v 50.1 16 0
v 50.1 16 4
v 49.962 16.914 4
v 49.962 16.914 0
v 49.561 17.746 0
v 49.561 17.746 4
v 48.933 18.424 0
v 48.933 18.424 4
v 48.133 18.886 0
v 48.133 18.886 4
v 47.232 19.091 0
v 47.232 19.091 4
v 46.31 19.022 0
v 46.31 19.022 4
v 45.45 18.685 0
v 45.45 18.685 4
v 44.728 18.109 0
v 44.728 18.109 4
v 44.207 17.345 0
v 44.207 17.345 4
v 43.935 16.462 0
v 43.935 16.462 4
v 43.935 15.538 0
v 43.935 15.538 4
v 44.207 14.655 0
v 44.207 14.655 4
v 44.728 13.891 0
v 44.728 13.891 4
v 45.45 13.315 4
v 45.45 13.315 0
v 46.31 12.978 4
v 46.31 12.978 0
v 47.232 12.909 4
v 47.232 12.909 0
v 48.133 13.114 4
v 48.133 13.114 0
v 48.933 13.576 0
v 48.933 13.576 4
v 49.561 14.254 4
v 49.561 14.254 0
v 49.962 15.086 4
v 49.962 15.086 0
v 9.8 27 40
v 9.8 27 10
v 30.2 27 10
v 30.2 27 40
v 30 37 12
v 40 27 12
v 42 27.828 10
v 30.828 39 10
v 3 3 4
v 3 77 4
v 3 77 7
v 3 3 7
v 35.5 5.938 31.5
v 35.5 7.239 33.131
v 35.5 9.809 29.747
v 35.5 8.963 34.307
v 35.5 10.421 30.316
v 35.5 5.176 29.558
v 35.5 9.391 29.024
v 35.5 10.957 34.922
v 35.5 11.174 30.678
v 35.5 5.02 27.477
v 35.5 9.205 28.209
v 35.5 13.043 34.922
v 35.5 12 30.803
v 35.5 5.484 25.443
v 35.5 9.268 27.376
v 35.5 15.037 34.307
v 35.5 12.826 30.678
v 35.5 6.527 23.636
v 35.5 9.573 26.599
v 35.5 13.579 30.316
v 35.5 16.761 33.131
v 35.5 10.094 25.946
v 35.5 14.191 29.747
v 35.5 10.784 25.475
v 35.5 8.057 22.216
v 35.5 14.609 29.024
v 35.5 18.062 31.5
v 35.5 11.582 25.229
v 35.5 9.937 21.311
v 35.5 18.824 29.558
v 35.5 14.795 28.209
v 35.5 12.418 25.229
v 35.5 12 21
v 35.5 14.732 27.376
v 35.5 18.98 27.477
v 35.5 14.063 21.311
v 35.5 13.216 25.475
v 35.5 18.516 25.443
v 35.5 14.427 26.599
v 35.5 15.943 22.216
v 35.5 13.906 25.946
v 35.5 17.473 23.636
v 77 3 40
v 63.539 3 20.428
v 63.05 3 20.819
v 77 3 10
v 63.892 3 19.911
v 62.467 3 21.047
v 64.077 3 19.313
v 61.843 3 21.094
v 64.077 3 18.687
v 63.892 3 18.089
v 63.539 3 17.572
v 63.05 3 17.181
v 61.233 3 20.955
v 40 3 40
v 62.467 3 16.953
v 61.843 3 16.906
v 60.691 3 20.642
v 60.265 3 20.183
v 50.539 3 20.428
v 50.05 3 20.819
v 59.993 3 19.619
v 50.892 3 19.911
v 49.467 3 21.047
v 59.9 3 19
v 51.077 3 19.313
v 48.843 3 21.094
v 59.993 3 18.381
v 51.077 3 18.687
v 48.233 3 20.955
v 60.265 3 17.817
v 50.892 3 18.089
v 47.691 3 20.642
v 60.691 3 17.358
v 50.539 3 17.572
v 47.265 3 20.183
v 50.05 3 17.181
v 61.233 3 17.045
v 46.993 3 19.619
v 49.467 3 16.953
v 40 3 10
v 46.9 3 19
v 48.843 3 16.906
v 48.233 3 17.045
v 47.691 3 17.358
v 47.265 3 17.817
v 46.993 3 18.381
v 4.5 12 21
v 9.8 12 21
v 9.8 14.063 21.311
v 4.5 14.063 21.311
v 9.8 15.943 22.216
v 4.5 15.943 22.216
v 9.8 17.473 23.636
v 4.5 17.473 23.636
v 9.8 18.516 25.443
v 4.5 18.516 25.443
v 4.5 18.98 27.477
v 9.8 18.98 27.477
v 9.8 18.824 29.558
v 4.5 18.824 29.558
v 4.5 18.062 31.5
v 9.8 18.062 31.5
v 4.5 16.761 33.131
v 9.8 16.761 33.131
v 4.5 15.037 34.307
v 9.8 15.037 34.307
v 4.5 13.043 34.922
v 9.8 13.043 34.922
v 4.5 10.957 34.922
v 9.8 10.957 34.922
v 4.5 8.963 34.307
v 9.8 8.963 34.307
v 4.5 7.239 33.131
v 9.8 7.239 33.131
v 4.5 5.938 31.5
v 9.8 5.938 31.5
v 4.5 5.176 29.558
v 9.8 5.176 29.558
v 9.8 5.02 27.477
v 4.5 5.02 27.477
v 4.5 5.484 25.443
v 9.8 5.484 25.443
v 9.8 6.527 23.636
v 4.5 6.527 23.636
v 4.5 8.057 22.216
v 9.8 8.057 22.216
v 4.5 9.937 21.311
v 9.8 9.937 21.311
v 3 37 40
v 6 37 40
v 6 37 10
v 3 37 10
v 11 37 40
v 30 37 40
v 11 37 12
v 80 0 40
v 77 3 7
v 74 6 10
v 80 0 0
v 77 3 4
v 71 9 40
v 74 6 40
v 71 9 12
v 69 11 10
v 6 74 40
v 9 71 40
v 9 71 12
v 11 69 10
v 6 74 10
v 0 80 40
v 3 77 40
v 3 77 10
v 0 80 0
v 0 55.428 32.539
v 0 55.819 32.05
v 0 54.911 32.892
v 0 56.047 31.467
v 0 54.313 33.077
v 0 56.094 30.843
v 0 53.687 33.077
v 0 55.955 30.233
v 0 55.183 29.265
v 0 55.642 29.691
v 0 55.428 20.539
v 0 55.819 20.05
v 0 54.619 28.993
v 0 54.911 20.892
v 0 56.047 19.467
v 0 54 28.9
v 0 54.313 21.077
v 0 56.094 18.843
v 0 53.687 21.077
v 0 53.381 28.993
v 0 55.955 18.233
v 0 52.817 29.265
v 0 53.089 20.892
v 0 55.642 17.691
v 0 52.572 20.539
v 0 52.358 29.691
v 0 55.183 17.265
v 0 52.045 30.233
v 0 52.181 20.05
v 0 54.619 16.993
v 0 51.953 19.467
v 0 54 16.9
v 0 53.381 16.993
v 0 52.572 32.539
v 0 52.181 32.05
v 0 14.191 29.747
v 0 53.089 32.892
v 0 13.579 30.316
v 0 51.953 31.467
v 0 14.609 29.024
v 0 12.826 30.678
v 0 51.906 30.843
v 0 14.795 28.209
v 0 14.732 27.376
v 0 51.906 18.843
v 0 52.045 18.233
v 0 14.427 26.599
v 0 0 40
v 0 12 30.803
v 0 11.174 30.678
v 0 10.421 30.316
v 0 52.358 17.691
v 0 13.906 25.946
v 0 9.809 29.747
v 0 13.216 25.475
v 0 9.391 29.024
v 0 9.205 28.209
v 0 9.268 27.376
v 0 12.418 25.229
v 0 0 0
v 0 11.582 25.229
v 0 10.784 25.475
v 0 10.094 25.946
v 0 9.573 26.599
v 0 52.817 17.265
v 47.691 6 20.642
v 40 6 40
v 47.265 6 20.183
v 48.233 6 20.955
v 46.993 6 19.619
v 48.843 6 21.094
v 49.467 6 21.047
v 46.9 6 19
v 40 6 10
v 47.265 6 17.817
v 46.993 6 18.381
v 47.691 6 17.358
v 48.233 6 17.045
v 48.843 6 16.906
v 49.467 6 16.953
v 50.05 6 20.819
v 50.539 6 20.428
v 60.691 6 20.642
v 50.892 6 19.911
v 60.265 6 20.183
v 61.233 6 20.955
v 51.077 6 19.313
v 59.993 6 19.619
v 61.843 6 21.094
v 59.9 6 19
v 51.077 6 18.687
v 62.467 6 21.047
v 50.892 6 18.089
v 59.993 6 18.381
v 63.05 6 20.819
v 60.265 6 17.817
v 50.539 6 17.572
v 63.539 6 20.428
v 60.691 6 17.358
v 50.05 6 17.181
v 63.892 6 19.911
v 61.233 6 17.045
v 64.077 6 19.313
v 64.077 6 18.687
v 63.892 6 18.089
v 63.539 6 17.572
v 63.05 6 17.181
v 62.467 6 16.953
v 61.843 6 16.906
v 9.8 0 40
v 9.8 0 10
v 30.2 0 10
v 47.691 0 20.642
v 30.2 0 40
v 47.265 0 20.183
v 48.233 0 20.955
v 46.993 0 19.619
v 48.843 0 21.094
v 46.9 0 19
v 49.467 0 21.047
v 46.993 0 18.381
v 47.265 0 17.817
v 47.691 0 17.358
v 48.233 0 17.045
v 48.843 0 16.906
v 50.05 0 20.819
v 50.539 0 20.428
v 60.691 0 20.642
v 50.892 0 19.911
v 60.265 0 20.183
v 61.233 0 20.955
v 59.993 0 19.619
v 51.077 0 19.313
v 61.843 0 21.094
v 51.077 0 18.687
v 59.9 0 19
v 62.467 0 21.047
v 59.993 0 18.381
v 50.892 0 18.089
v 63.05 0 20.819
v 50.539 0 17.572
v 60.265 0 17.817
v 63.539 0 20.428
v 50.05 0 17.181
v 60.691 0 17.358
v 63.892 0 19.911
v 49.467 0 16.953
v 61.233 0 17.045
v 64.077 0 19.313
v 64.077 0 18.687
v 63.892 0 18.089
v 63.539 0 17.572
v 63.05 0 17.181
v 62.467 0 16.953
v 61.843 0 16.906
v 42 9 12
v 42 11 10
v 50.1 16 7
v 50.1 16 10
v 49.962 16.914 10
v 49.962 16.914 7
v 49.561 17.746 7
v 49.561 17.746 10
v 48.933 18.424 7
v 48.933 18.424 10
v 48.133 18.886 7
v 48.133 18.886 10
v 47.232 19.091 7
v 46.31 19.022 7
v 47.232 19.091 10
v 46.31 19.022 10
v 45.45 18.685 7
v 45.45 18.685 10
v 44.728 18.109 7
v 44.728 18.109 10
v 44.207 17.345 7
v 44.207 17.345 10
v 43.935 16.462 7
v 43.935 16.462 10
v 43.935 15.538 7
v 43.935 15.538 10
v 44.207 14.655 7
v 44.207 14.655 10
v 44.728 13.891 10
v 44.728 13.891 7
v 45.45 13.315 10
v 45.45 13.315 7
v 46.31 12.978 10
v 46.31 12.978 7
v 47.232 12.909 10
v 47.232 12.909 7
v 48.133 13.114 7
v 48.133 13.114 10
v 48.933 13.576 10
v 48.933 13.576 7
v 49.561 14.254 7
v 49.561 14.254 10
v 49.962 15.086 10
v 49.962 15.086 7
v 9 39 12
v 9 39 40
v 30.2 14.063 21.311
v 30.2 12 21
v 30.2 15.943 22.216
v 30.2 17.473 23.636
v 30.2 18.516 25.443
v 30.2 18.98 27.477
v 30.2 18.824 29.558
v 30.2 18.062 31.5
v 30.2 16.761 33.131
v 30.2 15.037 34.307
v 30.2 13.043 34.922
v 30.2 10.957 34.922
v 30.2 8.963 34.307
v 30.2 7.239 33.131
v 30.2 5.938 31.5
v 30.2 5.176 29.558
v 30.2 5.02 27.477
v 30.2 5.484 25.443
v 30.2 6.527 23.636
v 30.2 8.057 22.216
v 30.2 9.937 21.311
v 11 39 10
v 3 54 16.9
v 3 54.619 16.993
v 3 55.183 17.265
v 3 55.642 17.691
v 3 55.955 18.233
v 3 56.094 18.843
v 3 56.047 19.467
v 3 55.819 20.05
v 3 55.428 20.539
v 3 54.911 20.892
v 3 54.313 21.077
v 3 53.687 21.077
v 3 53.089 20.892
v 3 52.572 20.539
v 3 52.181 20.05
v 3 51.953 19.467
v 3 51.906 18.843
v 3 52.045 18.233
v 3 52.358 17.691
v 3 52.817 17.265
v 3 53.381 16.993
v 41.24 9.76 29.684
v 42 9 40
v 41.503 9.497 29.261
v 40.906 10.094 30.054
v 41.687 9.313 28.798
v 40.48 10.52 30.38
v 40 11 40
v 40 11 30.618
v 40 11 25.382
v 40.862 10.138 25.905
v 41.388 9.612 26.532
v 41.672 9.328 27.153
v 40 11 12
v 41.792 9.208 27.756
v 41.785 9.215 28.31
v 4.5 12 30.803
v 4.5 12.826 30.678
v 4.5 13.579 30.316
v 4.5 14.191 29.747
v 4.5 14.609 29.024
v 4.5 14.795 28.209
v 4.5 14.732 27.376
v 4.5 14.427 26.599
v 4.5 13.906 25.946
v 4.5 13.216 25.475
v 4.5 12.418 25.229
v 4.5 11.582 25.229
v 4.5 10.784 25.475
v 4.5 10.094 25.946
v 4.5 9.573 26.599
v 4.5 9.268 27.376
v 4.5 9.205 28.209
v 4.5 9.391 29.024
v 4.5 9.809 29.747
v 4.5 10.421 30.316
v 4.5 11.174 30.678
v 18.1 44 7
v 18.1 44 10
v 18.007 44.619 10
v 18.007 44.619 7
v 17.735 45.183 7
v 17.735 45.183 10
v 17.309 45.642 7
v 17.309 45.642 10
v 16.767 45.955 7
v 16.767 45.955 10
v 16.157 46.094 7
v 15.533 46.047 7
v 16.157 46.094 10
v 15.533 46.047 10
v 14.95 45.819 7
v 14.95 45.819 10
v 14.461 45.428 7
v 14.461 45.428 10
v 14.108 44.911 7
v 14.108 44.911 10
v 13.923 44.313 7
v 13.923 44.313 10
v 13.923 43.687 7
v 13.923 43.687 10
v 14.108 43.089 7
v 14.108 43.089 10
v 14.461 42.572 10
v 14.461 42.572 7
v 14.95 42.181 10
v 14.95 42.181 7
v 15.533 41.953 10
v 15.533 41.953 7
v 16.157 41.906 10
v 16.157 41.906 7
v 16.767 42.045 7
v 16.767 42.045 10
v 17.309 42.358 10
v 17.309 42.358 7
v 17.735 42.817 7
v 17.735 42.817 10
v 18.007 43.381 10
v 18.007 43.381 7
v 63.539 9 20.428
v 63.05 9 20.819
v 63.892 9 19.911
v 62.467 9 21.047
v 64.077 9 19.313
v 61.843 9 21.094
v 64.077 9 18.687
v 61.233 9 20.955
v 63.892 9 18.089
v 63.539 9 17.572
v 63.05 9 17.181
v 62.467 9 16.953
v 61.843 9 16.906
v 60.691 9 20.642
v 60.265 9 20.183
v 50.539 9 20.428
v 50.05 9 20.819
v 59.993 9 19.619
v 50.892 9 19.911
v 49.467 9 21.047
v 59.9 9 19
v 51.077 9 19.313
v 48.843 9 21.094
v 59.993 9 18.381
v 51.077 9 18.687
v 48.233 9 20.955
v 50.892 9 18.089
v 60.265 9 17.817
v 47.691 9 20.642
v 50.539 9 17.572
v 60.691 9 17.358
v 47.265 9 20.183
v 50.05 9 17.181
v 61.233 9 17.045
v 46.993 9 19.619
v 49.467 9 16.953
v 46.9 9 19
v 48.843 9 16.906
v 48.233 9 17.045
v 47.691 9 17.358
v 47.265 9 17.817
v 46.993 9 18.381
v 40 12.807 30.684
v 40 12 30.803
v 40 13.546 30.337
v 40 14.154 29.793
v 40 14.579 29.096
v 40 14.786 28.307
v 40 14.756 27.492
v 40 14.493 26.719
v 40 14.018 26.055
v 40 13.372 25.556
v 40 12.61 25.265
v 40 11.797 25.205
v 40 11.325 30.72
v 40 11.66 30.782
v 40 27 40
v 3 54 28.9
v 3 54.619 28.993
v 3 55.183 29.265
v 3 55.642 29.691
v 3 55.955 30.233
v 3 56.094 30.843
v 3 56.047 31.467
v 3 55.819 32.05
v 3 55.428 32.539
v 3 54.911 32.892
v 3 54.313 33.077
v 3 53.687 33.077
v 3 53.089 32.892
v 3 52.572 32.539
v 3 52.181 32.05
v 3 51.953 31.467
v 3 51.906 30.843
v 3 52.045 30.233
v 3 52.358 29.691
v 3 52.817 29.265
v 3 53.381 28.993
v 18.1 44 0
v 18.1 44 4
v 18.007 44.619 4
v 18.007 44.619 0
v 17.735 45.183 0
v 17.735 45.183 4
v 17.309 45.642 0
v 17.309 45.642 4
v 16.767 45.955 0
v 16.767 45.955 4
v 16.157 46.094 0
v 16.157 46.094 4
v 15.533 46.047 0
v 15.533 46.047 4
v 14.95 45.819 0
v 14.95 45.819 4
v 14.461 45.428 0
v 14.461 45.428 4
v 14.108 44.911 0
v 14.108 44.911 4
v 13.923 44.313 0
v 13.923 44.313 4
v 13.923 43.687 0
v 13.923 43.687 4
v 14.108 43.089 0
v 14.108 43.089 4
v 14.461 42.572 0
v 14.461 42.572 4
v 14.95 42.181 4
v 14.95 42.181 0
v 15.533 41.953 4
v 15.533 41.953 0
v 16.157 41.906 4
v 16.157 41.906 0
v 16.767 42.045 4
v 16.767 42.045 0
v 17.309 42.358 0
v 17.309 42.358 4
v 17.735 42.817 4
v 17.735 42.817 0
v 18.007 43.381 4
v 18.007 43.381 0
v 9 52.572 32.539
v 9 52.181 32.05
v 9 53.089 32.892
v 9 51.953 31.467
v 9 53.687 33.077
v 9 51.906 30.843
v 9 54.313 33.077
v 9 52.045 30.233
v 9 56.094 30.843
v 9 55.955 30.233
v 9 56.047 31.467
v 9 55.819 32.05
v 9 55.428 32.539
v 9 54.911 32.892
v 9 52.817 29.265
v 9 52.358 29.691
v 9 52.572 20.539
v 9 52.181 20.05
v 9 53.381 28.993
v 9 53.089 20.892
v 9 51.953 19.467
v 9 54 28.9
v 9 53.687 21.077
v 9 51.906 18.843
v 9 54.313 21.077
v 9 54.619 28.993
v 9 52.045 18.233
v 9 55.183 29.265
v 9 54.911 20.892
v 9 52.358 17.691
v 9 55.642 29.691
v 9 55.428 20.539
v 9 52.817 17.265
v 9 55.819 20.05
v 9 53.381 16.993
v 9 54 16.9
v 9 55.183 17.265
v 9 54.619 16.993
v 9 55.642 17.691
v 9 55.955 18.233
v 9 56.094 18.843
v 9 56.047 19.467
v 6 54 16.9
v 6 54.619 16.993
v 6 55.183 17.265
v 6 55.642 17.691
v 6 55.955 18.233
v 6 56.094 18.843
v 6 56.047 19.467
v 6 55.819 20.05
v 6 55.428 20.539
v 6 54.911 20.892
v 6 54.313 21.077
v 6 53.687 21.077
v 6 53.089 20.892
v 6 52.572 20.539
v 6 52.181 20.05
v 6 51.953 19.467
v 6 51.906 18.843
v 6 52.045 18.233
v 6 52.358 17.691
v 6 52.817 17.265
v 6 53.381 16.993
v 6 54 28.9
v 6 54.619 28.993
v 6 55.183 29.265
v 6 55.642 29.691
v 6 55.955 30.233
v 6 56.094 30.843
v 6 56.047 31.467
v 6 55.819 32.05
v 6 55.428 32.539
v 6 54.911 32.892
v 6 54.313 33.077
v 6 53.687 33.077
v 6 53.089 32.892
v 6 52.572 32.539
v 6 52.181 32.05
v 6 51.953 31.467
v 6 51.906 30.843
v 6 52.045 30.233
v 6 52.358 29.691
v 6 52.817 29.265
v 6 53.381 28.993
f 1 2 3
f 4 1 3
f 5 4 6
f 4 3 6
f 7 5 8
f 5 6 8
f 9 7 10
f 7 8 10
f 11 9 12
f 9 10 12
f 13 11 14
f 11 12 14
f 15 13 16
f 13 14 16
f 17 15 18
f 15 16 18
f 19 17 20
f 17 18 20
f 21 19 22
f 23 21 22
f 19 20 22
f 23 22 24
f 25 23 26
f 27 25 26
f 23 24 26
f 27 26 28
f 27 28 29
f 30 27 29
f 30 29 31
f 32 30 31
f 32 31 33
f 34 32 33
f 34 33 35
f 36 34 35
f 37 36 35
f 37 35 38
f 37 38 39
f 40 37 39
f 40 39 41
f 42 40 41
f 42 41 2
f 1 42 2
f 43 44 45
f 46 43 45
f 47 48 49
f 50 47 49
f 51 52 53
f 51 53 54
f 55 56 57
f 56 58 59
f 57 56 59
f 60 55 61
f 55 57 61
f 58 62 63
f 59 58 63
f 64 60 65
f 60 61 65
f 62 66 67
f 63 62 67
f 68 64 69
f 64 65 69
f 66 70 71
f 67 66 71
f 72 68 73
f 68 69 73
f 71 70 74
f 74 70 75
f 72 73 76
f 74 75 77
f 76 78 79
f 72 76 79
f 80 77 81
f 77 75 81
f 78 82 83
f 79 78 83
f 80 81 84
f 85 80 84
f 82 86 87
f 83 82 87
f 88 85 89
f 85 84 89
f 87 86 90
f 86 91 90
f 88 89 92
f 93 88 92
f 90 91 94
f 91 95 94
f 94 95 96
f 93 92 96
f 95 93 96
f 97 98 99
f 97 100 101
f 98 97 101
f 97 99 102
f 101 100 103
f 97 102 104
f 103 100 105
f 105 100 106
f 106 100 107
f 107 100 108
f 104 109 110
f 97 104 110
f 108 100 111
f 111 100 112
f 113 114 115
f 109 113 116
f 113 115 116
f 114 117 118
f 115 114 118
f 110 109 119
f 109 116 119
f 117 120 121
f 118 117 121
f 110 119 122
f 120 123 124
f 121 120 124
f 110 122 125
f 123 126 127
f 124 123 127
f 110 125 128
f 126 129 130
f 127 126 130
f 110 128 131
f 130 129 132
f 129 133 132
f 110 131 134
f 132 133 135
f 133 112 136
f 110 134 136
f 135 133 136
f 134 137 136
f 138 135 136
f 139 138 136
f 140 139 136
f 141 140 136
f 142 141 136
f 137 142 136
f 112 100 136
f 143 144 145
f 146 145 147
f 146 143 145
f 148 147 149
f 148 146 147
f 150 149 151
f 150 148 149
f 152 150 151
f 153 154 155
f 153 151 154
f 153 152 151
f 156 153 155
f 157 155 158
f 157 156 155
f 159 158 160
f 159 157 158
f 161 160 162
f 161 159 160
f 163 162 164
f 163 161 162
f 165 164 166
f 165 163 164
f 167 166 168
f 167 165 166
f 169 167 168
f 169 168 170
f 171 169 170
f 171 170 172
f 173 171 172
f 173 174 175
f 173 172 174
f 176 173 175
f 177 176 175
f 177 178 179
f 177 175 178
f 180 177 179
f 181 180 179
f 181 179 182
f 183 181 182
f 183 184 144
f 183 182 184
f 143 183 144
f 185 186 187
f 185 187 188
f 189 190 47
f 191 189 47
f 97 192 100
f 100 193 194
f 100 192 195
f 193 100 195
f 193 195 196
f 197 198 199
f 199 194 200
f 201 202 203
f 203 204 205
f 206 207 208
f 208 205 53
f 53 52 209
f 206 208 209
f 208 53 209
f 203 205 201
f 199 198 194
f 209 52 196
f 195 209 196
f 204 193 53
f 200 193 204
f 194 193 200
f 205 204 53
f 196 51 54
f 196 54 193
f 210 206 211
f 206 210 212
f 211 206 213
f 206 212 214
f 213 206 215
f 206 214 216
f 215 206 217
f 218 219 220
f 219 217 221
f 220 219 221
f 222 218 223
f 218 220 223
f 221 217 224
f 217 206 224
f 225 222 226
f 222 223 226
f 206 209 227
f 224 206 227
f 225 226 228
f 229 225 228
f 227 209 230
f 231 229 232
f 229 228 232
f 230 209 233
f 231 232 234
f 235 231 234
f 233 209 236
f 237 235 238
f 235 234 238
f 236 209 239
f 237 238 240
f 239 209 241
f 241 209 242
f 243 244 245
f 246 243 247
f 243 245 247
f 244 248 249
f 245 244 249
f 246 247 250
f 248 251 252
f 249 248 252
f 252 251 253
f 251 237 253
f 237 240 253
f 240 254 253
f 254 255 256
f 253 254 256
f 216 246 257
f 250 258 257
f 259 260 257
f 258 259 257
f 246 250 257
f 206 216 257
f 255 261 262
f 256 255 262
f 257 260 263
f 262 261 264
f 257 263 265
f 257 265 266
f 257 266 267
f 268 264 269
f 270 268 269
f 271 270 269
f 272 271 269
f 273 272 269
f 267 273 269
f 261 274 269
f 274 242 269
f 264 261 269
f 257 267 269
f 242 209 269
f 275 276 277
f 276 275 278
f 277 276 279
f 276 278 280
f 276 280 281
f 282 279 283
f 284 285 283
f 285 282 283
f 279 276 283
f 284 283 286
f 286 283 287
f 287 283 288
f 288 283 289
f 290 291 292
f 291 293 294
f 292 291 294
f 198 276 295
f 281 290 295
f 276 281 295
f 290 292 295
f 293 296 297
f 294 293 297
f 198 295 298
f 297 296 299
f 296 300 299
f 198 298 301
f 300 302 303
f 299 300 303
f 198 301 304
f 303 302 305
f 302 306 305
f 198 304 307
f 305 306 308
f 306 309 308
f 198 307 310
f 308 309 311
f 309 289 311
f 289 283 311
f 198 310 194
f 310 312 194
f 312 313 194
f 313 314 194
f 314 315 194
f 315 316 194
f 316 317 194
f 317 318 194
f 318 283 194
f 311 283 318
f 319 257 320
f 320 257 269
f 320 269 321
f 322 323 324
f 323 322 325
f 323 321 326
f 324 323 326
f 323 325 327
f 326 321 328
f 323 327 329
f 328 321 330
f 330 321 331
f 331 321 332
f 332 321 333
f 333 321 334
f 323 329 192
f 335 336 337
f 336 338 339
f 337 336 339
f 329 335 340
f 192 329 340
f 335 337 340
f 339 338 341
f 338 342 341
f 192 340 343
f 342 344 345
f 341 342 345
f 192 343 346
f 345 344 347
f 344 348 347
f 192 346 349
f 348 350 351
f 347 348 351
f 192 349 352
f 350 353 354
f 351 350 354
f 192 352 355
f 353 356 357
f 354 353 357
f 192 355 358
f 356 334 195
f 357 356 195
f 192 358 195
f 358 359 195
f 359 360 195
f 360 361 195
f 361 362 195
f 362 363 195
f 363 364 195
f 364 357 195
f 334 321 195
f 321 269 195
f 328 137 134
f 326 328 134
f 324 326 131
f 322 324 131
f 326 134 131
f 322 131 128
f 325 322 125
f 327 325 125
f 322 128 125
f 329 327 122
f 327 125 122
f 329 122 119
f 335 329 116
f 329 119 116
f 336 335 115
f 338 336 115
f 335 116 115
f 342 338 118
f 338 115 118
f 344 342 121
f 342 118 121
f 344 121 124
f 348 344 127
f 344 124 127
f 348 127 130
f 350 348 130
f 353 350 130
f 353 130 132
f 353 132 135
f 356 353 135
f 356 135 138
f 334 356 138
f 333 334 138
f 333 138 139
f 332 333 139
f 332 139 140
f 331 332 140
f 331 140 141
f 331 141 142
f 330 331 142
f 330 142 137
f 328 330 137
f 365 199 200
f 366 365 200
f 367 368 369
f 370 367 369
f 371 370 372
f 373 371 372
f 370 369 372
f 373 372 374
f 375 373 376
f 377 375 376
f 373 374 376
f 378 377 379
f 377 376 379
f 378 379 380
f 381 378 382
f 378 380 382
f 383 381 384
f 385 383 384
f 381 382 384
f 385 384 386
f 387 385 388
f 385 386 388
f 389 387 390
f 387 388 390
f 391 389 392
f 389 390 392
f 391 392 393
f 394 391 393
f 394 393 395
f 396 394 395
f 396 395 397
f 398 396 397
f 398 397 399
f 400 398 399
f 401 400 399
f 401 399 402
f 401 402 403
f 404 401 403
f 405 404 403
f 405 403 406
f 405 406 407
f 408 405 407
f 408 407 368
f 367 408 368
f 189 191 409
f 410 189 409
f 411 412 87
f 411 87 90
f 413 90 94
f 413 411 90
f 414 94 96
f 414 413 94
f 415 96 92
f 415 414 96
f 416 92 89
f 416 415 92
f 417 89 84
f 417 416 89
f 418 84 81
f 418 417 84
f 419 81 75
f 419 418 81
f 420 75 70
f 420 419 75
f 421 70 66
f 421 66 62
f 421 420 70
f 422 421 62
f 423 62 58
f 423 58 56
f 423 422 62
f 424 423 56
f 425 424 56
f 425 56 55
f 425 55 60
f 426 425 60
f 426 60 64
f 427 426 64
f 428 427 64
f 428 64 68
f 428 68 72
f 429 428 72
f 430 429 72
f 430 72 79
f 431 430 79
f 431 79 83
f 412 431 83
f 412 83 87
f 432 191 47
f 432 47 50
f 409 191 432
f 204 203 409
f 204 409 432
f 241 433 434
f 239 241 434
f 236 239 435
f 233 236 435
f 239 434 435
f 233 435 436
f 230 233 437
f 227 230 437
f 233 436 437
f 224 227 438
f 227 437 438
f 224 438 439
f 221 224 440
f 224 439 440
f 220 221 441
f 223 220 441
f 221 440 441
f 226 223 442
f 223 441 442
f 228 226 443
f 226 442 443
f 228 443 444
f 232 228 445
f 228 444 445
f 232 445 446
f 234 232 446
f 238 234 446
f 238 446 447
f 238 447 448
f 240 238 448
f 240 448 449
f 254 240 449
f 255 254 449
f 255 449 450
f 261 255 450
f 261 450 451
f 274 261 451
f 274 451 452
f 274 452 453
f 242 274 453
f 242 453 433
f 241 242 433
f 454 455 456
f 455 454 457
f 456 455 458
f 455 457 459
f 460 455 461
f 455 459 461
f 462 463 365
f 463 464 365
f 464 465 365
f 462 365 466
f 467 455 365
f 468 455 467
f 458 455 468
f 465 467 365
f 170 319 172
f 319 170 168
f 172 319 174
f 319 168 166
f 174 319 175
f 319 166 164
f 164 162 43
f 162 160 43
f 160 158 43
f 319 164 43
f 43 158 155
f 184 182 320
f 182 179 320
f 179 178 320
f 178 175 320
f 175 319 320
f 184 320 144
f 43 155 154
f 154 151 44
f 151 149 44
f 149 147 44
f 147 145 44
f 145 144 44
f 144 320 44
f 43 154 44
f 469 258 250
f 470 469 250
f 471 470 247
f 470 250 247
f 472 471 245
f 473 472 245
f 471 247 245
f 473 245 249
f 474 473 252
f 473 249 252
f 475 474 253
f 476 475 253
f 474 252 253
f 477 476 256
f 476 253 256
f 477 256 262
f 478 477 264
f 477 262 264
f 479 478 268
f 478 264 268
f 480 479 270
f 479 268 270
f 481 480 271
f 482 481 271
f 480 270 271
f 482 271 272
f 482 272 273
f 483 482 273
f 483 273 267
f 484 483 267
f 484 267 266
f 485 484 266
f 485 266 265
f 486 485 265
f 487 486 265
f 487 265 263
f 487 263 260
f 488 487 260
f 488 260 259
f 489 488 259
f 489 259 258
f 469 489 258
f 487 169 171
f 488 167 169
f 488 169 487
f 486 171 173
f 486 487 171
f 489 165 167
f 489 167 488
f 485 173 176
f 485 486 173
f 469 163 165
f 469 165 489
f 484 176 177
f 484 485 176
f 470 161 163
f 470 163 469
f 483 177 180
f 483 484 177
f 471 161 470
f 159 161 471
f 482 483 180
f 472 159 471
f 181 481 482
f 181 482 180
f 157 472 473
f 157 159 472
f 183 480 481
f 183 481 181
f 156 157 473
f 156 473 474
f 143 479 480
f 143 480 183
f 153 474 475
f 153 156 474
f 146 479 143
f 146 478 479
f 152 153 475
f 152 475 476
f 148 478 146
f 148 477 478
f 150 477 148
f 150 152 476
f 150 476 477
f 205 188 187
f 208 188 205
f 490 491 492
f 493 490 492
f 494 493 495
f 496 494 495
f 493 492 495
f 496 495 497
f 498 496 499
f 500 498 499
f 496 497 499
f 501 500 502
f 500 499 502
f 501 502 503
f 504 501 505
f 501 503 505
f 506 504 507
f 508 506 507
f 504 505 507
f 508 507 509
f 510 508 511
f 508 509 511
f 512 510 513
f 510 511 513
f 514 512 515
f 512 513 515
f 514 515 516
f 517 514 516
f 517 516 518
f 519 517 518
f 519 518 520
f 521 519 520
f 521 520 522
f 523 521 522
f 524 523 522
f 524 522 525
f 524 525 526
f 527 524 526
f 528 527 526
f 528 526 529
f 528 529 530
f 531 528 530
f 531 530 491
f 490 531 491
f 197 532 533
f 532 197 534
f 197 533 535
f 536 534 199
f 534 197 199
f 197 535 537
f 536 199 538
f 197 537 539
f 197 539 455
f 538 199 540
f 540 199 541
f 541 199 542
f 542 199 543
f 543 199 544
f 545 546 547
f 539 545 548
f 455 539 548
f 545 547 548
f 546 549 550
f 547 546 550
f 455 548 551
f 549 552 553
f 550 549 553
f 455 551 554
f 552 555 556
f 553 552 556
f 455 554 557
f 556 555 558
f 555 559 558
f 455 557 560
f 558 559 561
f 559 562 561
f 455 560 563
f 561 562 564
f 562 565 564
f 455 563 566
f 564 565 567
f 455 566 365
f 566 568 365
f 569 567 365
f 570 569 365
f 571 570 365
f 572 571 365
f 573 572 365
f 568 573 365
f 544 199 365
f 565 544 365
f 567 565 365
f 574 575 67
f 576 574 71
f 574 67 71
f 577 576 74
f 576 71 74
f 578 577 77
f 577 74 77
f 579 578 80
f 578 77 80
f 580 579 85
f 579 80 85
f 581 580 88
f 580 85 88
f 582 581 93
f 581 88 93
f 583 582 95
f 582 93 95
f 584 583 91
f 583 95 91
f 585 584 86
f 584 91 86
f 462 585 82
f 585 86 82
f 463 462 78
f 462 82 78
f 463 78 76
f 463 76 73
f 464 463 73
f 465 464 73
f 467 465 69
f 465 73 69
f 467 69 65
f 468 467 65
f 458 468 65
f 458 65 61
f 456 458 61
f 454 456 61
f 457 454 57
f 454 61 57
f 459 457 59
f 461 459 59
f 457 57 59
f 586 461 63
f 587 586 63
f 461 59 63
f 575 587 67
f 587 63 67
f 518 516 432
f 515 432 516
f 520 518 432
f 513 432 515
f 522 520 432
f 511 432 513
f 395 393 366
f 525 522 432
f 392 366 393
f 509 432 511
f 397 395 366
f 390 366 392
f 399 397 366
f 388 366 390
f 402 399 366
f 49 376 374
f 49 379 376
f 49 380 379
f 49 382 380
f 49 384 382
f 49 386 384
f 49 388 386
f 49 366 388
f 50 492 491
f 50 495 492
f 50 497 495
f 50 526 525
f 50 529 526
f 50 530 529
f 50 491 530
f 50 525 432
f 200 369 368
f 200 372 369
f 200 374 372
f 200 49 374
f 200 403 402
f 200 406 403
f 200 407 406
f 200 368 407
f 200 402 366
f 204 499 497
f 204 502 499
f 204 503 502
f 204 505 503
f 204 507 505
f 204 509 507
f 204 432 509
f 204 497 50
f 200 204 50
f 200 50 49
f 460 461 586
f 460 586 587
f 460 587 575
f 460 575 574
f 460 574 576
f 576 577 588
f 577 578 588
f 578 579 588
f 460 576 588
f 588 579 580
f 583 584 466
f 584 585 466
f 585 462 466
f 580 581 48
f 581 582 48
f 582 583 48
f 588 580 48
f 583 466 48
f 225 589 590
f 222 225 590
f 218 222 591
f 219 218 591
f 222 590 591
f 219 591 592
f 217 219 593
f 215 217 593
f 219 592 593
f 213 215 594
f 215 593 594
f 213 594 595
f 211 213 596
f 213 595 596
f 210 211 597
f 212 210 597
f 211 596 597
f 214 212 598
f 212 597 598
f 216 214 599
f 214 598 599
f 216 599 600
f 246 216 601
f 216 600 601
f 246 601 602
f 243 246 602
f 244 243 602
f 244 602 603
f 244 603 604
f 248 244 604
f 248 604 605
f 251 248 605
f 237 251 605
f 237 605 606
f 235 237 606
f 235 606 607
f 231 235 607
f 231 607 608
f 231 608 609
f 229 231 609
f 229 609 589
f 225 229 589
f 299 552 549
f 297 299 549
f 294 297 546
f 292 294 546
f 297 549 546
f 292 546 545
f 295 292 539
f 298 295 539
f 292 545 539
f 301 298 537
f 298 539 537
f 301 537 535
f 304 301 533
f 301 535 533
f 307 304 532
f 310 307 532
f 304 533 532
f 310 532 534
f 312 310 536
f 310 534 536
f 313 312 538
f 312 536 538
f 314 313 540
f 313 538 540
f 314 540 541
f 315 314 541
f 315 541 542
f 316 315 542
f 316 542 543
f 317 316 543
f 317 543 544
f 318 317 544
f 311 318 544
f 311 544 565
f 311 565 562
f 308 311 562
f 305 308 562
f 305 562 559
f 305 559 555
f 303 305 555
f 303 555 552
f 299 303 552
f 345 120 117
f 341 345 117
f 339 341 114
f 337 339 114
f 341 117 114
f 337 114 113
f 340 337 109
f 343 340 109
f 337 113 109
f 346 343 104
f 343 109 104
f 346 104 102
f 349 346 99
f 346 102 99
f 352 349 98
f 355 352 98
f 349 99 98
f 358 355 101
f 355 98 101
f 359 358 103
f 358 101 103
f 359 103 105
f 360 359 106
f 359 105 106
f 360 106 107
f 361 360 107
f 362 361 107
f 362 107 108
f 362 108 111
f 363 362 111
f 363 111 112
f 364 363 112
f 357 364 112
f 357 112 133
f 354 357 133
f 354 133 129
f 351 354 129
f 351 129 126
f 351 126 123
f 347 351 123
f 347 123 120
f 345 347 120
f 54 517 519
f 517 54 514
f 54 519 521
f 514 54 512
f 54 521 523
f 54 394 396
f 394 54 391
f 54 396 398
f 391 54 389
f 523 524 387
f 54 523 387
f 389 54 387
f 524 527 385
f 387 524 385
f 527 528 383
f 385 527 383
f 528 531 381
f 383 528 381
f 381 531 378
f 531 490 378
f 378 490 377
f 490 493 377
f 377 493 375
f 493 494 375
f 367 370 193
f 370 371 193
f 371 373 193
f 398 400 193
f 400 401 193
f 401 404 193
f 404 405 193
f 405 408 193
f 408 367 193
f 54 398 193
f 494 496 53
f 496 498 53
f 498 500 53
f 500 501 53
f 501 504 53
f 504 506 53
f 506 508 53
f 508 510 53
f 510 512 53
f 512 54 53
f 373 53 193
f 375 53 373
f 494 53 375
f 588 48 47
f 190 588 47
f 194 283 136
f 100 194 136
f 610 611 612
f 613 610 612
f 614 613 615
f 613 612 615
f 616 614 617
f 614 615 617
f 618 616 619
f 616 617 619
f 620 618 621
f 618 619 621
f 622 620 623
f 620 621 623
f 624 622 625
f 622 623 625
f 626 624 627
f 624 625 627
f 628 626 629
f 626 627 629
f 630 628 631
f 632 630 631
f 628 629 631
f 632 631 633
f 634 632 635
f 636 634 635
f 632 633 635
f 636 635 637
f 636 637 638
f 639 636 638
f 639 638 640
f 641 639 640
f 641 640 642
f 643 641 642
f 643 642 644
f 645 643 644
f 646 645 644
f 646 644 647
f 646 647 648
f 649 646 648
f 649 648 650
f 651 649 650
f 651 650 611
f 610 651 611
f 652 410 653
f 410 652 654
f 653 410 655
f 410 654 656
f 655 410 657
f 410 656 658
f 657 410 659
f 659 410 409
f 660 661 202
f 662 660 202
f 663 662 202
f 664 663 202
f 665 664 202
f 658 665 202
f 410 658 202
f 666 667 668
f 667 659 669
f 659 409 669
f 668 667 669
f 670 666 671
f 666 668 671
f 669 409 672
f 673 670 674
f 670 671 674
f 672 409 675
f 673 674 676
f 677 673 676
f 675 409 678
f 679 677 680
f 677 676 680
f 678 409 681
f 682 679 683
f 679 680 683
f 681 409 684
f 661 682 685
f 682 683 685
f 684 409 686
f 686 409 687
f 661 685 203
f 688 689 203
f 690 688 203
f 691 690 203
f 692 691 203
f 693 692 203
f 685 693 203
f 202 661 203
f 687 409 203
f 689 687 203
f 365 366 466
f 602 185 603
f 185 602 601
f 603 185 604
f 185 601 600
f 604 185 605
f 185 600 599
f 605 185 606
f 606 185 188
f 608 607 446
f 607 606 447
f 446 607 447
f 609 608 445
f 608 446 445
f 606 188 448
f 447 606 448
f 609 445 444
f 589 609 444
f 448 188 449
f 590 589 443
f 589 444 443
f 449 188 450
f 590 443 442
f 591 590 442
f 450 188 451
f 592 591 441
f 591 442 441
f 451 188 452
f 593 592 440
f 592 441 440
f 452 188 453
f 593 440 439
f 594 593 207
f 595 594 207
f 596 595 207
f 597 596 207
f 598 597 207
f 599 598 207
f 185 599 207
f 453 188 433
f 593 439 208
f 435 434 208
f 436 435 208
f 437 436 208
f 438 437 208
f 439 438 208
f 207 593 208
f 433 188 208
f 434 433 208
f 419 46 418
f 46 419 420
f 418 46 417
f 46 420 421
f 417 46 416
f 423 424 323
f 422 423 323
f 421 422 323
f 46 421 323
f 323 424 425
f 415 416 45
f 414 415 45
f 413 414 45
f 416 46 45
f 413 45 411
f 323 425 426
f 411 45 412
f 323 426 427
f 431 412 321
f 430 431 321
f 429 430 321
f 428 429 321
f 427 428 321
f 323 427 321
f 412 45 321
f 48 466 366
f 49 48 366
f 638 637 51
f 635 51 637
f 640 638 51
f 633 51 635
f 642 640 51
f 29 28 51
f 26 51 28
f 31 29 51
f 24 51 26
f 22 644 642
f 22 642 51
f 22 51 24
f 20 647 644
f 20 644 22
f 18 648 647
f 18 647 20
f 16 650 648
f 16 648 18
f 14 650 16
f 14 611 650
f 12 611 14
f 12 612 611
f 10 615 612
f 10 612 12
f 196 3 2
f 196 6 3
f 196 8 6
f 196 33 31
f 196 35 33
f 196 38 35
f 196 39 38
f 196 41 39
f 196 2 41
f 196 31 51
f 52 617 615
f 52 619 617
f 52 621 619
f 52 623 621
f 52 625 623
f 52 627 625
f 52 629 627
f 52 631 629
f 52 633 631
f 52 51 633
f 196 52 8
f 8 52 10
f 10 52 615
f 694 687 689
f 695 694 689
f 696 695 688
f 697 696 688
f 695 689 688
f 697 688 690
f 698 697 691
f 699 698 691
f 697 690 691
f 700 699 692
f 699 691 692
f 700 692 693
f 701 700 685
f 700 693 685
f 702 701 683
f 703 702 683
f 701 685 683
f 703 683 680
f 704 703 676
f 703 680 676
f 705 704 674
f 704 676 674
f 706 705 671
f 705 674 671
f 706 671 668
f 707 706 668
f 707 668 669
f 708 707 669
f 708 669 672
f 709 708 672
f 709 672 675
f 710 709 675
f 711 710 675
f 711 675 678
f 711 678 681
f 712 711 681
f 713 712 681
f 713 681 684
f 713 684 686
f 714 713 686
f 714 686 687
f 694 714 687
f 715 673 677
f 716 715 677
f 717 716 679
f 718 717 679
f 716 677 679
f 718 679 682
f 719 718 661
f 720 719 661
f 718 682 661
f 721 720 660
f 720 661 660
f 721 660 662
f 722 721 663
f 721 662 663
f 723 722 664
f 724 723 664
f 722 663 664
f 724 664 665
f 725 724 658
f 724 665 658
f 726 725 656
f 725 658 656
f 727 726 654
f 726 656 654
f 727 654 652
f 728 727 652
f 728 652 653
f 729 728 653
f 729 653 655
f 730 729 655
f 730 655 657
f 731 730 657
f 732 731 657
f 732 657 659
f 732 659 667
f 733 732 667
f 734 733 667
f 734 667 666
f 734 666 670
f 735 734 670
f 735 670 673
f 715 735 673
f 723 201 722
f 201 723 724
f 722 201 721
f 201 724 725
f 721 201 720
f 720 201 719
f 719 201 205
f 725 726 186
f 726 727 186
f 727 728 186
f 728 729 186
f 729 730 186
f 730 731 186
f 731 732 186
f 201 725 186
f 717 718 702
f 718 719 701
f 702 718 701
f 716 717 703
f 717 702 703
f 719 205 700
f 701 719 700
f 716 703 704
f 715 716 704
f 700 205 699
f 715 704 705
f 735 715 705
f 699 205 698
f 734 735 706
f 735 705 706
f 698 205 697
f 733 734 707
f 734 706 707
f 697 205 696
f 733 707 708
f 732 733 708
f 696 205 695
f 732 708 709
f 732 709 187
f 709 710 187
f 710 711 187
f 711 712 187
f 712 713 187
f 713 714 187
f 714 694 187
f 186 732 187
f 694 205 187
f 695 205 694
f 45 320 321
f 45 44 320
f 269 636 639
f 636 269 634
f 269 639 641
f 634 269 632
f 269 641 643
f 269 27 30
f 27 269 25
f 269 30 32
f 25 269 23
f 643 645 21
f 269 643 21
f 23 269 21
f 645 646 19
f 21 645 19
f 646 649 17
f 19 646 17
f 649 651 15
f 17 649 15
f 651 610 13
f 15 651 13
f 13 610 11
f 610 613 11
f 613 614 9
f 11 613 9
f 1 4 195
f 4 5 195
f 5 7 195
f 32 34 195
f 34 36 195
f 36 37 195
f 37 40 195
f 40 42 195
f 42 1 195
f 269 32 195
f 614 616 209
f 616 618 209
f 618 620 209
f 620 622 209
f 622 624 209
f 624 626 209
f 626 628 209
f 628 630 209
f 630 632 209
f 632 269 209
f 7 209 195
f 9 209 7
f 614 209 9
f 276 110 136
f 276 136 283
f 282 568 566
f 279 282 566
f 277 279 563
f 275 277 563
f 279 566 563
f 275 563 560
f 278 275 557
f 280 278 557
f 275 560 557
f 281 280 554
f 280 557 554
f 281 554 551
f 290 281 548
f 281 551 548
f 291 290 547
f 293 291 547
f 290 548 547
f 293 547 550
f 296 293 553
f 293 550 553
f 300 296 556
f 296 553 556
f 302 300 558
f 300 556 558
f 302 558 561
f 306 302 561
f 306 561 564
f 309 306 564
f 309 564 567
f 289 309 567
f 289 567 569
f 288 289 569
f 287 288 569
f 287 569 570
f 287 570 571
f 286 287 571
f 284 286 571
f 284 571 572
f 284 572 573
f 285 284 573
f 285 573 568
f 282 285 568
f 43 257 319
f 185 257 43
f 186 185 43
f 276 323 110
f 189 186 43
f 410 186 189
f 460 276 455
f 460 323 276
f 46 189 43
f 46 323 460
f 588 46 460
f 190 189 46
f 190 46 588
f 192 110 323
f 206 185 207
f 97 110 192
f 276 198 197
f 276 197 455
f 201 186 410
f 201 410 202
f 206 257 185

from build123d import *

# Parameters (mm, degrees)
DODANIE_WYCI_GNI_CIE1_DEPTH     = 4
DODANIE_WYCI_GNI_CIE2_DEPTH     = 3
DODANIE_WYCI_GNI_CIE3_DEPTH     = 3
DODANIE_WYCI_GNI_CIE4_DEPTH     = 30
WYTNIJ_WYCI_GNI_CIE1_DEPTH      = 15.5
WYTNIJ_WYCI_GNI_CIE1_DEPTH_BACK = 15.5
SZKIC5_R                        = 7
SZKIC6_R                        = 2.802594562
WYTNIJ_WYCI_GNI_CIE2_DEPTH      = 121
SFAZOWANIE1_SIZE                = 2
SZKIC7_R                        = 3.1
SZKIC7_R_2                      = 2.1
WYTNIJ_WYCI_GNI_CIE3_DEPTH      = 118.046999107
SZKIC8_R                        = 2.1
WYTNIJ_WYCI_GNI_CIE4_DEPTH      = 115.197197864
SZKIC9_R                        = 2.1
WYTNIJ_WYCI_GNI_CIE5_DEPTH      = 115.197197864


with BuildPart() as part:
    # Szkic1 → Dodanie-wyciągnięcie1 (new body)
    with BuildSketch(Plane.XY):
        Polygon((0, 0), (80, 0), (0, 80), align=None)
    extrude(amount=DODANIE_WYCI_GNI_CIE1_DEPTH)

    # Szkic2 → Dodanie-wyciągnięcie2 (add)
    with BuildSketch(Plane.XY.offset(4)):
        Polygon((3, 77), (3, 3), (77, 3), (80, 0), (0, 0), (0, 80), align=None)
    extrude(amount=DODANIE_WYCI_GNI_CIE2_DEPTH)

    # Szkic3 → Dodanie-wyciągnięcie3 (add)
    with BuildSketch(Plane.XY.offset(7)):
        Polygon((80, 0), (77, 3), (3, 77), (0, 80), (0, 0), align=None)
    extrude(amount=DODANIE_WYCI_GNI_CIE3_DEPTH)

    # Szkic4 → Dodanie-wyciągnięcie4 (add)
    with BuildSketch(Plane.XY.offset(10)):
        Polygon((30.2, 0), (80, 0), (77, 3), (40, 3), (40, 6), (74, 6), (71, 9), (40, 9), (40, 27), (30, 37), (9, 37), (9, 71), (6, 74), (6, 37), (3, 37), (3, 77), (0, 80), (0, 0), (9.8, 0), (9.8, 27), (30.2, 27), align=None)
    extrude(amount=DODANIE_WYCI_GNI_CIE4_DEPTH)

    # Szkic5 → Wytnij-wyciągnięcie1 (cut, two sides: drawn at the far end of the back side and taken through both)
    with BuildSketch(Plane(origin=(20, 0, 0), x_dir=(0, 0, -1), z_dir=(1, 0, 0)).offset(-WYTNIJ_WYCI_GNI_CIE1_DEPTH_BACK)):
        with Locations((-28, 12)):
            Circle(SZKIC5_R)
    extrude(amount=WYTNIJ_WYCI_GNI_CIE1_DEPTH + WYTNIJ_WYCI_GNI_CIE1_DEPTH_BACK, mode=Mode.SUBTRACT)

    # Szkic6 → Wytnij-wyciągnięcie2 (cut, through all)
    with BuildSketch(Plane.ZY):
        with Locations((28, 12)):
            Circle(SZKIC6_R)
    extrude(amount=-WYTNIJ_WYCI_GNI_CIE2_DEPTH, mode=Mode.SUBTRACT)

    # Sfazowanie1
    # the kernel refuses this chamfer: 2 mm, written as the material it adds along each edge
    with BuildSketch(Plane(origin=(10.333333333, 38.333333333, 11.333333333), x_dir=(-0.7071067811865475, 0.7071067811865475, 0), z_dir=(-0.5773502691896258, -0.5773502691896258, -0.5773502691896258))) as sfazowanie1_piece_1_section:
        Polygon((-1.414213562, -0.816496581), (1.414213562, -0.816496581), (0, 1.632993162), align=None)
    sfazowanie1_piece_1 = extrude(amount=2.540341184, mode=Mode.PRIVATE)
    sfazowanie1_piece_1 = split(sfazowanie1_piece_1, bisect_by=Plane(origin=(9, 37, 10), z_dir=(0, 1, 0)), keep=Keep.TOP, mode=Mode.PRIVATE)
    sfazowanie1_piece_1 = split(sfazowanie1_piece_1, bisect_by=Plane(origin=(9, 37, 10), z_dir=(1, 0, 0)), keep=Keep.TOP, mode=Mode.PRIVATE)
    sfazowanie1_piece_1 = split(sfazowanie1_piece_1, bisect_by=Plane(origin=(9, 37, 10), z_dir=(0, 0, 1)), keep=Keep.TOP, mode=Mode.PRIVATE)
    add(sfazowanie1_piece_1)
    with BuildSketch(Plane(origin=(41.333333333, 10.333333333, 11.333333333), x_dir=(0, -0.7071067811865475, 0.7071067811865475), z_dir=(-0.5773502691896258, -0.5773502691896258, -0.5773502691896258))) as sfazowanie1_piece_2_section:
        Polygon((-1.414213562, -0.816496581), (1.414213562, -0.816496581), (0, 1.632993162), align=None)
    sfazowanie1_piece_2 = extrude(amount=2.540341184, mode=Mode.PRIVATE)
    sfazowanie1_piece_2 = split(sfazowanie1_piece_2, bisect_by=Plane(origin=(40, 9, 10), z_dir=(0, 0, 1)), keep=Keep.TOP, mode=Mode.PRIVATE)
    sfazowanie1_piece_2 = split(sfazowanie1_piece_2, bisect_by=Plane(origin=(40, 9, 10), z_dir=(0, 1, 0)), keep=Keep.TOP, mode=Mode.PRIVATE)
    sfazowanie1_piece_2 = split(sfazowanie1_piece_2, bisect_by=Plane(origin=(40, 9, 10), z_dir=(1, 0, 0)), keep=Keep.TOP, mode=Mode.PRIVATE)
    add(sfazowanie1_piece_2)
    with BuildSketch(Plane(origin=(9, 37, 4.856634024), x_dir=(1, 0, 0), z_dir=(0, 0, 1))) as sfazowanie1_piece_3_section:
        Polygon((SFAZOWANIE1_SIZE, 0), (0, SFAZOWANIE1_SIZE), (0, 0), align=None)
    sfazowanie1_piece_3 = extrude(amount=35.143365976, mode=Mode.PRIVATE)
    sfazowanie1_piece_3 = split(sfazowanie1_piece_3, bisect_by=Plane(origin=(9, 37, 7), z_dir=(0, 0, 1)), keep=Keep.TOP, mode=Mode.PRIVATE)
    add(sfazowanie1_piece_3)
    with BuildSketch(Plane(origin=(76.143365976, 9, 10), x_dir=(0, 0, 1), z_dir=(-1, 0, 0))) as sfazowanie1_piece_4_section:
        Polygon((SFAZOWANIE1_SIZE, 0), (0, SFAZOWANIE1_SIZE), (0, 0), align=None)
    sfazowanie1_piece_4 = extrude(amount=41.286731952, mode=Mode.PRIVATE)
    sfazowanie1_piece_4 = split(sfazowanie1_piece_4, bisect_by=Plane(origin=(73.571682988, 6.428317012, 10), z_dir=(-0.7071067811865476, -0.7071067811865476, 0)), keep=Keep.TOP, mode=Mode.PRIVATE)
    add(sfazowanie1_piece_4)
    with BuildSketch(Plane(origin=(40, 9, 10), x_dir=(0, 0, 1), z_dir=(0, 1, 0))) as sfazowanie1_piece_5_section:
        Polygon((SFAZOWANIE1_SIZE, 0), (0, SFAZOWANIE1_SIZE), (0, 0), align=None)
    sfazowanie1_piece_5 = extrude(amount=23.143365976, mode=Mode.PRIVATE)
    sfazowanie1_piece_5 = split(sfazowanie1_piece_5, bisect_by=Plane(origin=(49, 18, 10), z_dir=(-0.7071067811865482, -0.7071067811865468, 0)), keep=Keep.TOP, mode=Mode.PRIVATE)
    add(sfazowanie1_piece_5)
    with BuildSketch(Plane(origin=(40, 9, 4.856634024), x_dir=(1, 0, 0), z_dir=(0, 0, 1))) as sfazowanie1_piece_6_section:
        Polygon((SFAZOWANIE1_SIZE, 0), (0, SFAZOWANIE1_SIZE), (0, 0), align=None)
    sfazowanie1_piece_6 = extrude(amount=35.143365976, mode=Mode.PRIVATE)
    sfazowanie1_piece_6 = split(sfazowanie1_piece_6, bisect_by=Plane(origin=(40, 9, 7), z_dir=(0, 0, 1)), keep=Keep.TOP, mode=Mode.PRIVATE)
    sfazowanie1_piece_6 = sfazowanie1_piece_6 - Plane(origin=(40, 12, 28), x_dir=(0, 0, 1), z_dir=(-1, 0, 0)) * Cylinder(2.802594562, 79, mode=Mode.PRIVATE)
    add(sfazowanie1_piece_6)
    with BuildSketch(Plane(origin=(43.63690896, 23.36309104, 10), x_dir=(0, 0, 1), z_dir=(-0.7071067811865468, 0.7071067811865482, 0))) as sfazowanie1_piece_7_section:
        Polygon((SFAZOWANIE1_SIZE, 0), (0, SFAZOWANIE1_SIZE), (0, 0), align=None)
    sfazowanie1_piece_7 = extrude(amount=24.428867576, mode=Mode.PRIVATE)
    sfazowanie1_piece_7 = split(sfazowanie1_piece_7, bisect_by=Plane(origin=(40, 23.36309104, 10), z_dir=(-1, 0, 0)), keep=Keep.TOP, mode=Mode.PRIVATE)
    sfazowanie1_piece_7 = split(sfazowanie1_piece_7, bisect_by=Plane(origin=(43.63690896, 37, 10), z_dir=(0, -1, 0)), keep=Keep.TOP, mode=Mode.PRIVATE)
    add(sfazowanie1_piece_7)
    with BuildSketch(Plane(origin=(9, 31.856634024, 10), x_dir=(0, 0, 1), z_dir=(0, 1, 0))) as sfazowanie1_piece_8_section:
        Polygon((SFAZOWANIE1_SIZE, 0), (0, SFAZOWANIE1_SIZE), (0, 0), align=None)
    sfazowanie1_piece_8 = extrude(amount=44.286731952, mode=Mode.PRIVATE)
    sfazowanie1_piece_8 = split(sfazowanie1_piece_8, bisect_by=Plane(origin=(28.571682988, 51.428317012, 10), z_dir=(-0.7071067811865476, -0.7071067811865476, 0)), keep=Keep.TOP, mode=Mode.PRIVATE)
    add(sfazowanie1_piece_8)
    with BuildSketch(Plane(origin=(35.143365976, 37, 10), x_dir=(0, 0, 1), z_dir=(-1, 0, 0))) as sfazowanie1_piece_9_section:
        Polygon((SFAZOWANIE1_SIZE, 0), (0, SFAZOWANIE1_SIZE), (0, 0), align=None)
    sfazowanie1_piece_9 = extrude(amount=31.286731952, mode=Mode.PRIVATE)
    sfazowanie1_piece_9 = split(sfazowanie1_piece_9, bisect_by=Plane(origin=(32.571682988, 34.428317012, 10), z_dir=(-0.7071067811865482, -0.7071067811865468, 0)), keep=Keep.TOP, mode=Mode.PRIVATE)
    sfazowanie1_piece_9 = split(sfazowanie1_piece_9, bisect_by=Plane(origin=(6, 37, 10), z_dir=(1, 0, 0)), keep=Keep.TOP, mode=Mode.PRIVATE)
    add(sfazowanie1_piece_9)
    with BuildSketch(Plane(origin=(40, 9, 10), x_dir=(0, 0, 1), z_dir=(0, 1, 0))) as sfazowanie1_piece_10a_section:
        Polygon((SFAZOWANIE1_SIZE, 0), (0, SFAZOWANIE1_SIZE), (0, 0), align=None)
    sfazowanie1_piece_10a = extrude(amount=23.143365976, mode=Mode.PRIVATE)
    sfazowanie1_piece_10a = split(sfazowanie1_piece_10a, bisect_by=Plane(origin=(49, 18, 10), z_dir=(0.7071067811865482, 0.7071067811865468, 0)), keep=Keep.TOP, mode=Mode.PRIVATE)
    with BuildSketch(Plane(origin=(43.63690896, 23.36309104, 10), x_dir=(0, 0, 1), z_dir=(-0.7071067811865468, 0.7071067811865482, 0))) as sfazowanie1_piece_10b_section:
        Polygon((SFAZOWANIE1_SIZE, 0), (0, SFAZOWANIE1_SIZE), (0, 0), align=None)
    sfazowanie1_piece_10b = extrude(amount=24.428867576, mode=Mode.PRIVATE)
    sfazowanie1_piece_10b = split(sfazowanie1_piece_10b, bisect_by=Plane(origin=(40, 23.36309104, 10), z_dir=(1, 0, 0)), keep=Keep.TOP, mode=Mode.PRIVATE)
    sfazowanie1_piece_10 = sfazowanie1_piece_10a & sfazowanie1_piece_10b
    add(sfazowanie1_piece_10)
    with BuildSketch(Plane(origin=(43.63690896, 23.36309104, 10), x_dir=(0, 0, 1), z_dir=(-0.7071067811865468, 0.7071067811865482, 0))) as sfazowanie1_piece_11a_section:
        Polygon((SFAZOWANIE1_SIZE, 0), (0, SFAZOWANIE1_SIZE), (0, 0), align=None)
    sfazowanie1_piece_11a = extrude(amount=24.428867576, mode=Mode.PRIVATE)
    sfazowanie1_piece_11a = split(sfazowanie1_piece_11a, bisect_by=Plane(origin=(43.63690896, 37, 10), z_dir=(0, 1, 0)), keep=Keep.TOP, mode=Mode.PRIVATE)
    with BuildSketch(Plane(origin=(35.143365976, 37, 10), x_dir=(0, 0, 1), z_dir=(-1, 0, 0))) as sfazowanie1_piece_11b_section:
        Polygon((SFAZOWANIE1_SIZE, 0), (0, SFAZOWANIE1_SIZE), (0, 0), align=None)
    sfazowanie1_piece_11b = extrude(amount=26.143365976, mode=Mode.PRIVATE)
    sfazowanie1_piece_11b = split(sfazowanie1_piece_11b, bisect_by=Plane(origin=(32.571682988, 34.428317012, 10), z_dir=(0.7071067811865482, 0.7071067811865468, 0)), keep=Keep.TOP, mode=Mode.PRIVATE)
    sfazowanie1_piece_11 = sfazowanie1_piece_11a & sfazowanie1_piece_11b
    add(sfazowanie1_piece_11)

    # Szkic7 → Wytnij-wyciągnięcie3 (cut, through all)
    with BuildSketch(Plane.XY.offset(10)):
        with Locations((47, 16)):
            Circle(SZKIC7_R)
        with Locations((16, 44)):
            Circle(SZKIC7_R_2)
    extrude(amount=-WYTNIJ_WYCI_GNI_CIE3_DEPTH, mode=Mode.SUBTRACT)

    # Szkic8 → Wytnij-wyciągnięcie4 (cut, through all)
    with BuildSketch(Plane(origin=(0, 9, 0), x_dir=(1, 0, 0), z_dir=(0, 1, 0))):
        with Locations(Location((49, -19, 0), (0, 0, 180))):
            Circle(SZKIC8_R)
        with Locations(Location((62, -19, 0), (0, 0, 180))):
            Circle(SZKIC8_R)
    extrude(amount=-WYTNIJ_WYCI_GNI_CIE4_DEPTH, mode=Mode.SUBTRACT)

    # Szkic9 → Wytnij-wyciągnięcie5 (cut, through all)
    with BuildSketch(Plane(origin=(9, 0, 0), x_dir=(0, 0, -1), z_dir=(1, 0, 0))):
        with Locations((-31, 54)):
            Circle(SZKIC9_R)
        with Locations((-19, 54)):
            Circle(SZKIC9_R)
    extrude(amount=-WYTNIJ_WYCI_GNI_CIE5_DEPTH, mode=Mode.SUBTRACT)


solid = part.part
